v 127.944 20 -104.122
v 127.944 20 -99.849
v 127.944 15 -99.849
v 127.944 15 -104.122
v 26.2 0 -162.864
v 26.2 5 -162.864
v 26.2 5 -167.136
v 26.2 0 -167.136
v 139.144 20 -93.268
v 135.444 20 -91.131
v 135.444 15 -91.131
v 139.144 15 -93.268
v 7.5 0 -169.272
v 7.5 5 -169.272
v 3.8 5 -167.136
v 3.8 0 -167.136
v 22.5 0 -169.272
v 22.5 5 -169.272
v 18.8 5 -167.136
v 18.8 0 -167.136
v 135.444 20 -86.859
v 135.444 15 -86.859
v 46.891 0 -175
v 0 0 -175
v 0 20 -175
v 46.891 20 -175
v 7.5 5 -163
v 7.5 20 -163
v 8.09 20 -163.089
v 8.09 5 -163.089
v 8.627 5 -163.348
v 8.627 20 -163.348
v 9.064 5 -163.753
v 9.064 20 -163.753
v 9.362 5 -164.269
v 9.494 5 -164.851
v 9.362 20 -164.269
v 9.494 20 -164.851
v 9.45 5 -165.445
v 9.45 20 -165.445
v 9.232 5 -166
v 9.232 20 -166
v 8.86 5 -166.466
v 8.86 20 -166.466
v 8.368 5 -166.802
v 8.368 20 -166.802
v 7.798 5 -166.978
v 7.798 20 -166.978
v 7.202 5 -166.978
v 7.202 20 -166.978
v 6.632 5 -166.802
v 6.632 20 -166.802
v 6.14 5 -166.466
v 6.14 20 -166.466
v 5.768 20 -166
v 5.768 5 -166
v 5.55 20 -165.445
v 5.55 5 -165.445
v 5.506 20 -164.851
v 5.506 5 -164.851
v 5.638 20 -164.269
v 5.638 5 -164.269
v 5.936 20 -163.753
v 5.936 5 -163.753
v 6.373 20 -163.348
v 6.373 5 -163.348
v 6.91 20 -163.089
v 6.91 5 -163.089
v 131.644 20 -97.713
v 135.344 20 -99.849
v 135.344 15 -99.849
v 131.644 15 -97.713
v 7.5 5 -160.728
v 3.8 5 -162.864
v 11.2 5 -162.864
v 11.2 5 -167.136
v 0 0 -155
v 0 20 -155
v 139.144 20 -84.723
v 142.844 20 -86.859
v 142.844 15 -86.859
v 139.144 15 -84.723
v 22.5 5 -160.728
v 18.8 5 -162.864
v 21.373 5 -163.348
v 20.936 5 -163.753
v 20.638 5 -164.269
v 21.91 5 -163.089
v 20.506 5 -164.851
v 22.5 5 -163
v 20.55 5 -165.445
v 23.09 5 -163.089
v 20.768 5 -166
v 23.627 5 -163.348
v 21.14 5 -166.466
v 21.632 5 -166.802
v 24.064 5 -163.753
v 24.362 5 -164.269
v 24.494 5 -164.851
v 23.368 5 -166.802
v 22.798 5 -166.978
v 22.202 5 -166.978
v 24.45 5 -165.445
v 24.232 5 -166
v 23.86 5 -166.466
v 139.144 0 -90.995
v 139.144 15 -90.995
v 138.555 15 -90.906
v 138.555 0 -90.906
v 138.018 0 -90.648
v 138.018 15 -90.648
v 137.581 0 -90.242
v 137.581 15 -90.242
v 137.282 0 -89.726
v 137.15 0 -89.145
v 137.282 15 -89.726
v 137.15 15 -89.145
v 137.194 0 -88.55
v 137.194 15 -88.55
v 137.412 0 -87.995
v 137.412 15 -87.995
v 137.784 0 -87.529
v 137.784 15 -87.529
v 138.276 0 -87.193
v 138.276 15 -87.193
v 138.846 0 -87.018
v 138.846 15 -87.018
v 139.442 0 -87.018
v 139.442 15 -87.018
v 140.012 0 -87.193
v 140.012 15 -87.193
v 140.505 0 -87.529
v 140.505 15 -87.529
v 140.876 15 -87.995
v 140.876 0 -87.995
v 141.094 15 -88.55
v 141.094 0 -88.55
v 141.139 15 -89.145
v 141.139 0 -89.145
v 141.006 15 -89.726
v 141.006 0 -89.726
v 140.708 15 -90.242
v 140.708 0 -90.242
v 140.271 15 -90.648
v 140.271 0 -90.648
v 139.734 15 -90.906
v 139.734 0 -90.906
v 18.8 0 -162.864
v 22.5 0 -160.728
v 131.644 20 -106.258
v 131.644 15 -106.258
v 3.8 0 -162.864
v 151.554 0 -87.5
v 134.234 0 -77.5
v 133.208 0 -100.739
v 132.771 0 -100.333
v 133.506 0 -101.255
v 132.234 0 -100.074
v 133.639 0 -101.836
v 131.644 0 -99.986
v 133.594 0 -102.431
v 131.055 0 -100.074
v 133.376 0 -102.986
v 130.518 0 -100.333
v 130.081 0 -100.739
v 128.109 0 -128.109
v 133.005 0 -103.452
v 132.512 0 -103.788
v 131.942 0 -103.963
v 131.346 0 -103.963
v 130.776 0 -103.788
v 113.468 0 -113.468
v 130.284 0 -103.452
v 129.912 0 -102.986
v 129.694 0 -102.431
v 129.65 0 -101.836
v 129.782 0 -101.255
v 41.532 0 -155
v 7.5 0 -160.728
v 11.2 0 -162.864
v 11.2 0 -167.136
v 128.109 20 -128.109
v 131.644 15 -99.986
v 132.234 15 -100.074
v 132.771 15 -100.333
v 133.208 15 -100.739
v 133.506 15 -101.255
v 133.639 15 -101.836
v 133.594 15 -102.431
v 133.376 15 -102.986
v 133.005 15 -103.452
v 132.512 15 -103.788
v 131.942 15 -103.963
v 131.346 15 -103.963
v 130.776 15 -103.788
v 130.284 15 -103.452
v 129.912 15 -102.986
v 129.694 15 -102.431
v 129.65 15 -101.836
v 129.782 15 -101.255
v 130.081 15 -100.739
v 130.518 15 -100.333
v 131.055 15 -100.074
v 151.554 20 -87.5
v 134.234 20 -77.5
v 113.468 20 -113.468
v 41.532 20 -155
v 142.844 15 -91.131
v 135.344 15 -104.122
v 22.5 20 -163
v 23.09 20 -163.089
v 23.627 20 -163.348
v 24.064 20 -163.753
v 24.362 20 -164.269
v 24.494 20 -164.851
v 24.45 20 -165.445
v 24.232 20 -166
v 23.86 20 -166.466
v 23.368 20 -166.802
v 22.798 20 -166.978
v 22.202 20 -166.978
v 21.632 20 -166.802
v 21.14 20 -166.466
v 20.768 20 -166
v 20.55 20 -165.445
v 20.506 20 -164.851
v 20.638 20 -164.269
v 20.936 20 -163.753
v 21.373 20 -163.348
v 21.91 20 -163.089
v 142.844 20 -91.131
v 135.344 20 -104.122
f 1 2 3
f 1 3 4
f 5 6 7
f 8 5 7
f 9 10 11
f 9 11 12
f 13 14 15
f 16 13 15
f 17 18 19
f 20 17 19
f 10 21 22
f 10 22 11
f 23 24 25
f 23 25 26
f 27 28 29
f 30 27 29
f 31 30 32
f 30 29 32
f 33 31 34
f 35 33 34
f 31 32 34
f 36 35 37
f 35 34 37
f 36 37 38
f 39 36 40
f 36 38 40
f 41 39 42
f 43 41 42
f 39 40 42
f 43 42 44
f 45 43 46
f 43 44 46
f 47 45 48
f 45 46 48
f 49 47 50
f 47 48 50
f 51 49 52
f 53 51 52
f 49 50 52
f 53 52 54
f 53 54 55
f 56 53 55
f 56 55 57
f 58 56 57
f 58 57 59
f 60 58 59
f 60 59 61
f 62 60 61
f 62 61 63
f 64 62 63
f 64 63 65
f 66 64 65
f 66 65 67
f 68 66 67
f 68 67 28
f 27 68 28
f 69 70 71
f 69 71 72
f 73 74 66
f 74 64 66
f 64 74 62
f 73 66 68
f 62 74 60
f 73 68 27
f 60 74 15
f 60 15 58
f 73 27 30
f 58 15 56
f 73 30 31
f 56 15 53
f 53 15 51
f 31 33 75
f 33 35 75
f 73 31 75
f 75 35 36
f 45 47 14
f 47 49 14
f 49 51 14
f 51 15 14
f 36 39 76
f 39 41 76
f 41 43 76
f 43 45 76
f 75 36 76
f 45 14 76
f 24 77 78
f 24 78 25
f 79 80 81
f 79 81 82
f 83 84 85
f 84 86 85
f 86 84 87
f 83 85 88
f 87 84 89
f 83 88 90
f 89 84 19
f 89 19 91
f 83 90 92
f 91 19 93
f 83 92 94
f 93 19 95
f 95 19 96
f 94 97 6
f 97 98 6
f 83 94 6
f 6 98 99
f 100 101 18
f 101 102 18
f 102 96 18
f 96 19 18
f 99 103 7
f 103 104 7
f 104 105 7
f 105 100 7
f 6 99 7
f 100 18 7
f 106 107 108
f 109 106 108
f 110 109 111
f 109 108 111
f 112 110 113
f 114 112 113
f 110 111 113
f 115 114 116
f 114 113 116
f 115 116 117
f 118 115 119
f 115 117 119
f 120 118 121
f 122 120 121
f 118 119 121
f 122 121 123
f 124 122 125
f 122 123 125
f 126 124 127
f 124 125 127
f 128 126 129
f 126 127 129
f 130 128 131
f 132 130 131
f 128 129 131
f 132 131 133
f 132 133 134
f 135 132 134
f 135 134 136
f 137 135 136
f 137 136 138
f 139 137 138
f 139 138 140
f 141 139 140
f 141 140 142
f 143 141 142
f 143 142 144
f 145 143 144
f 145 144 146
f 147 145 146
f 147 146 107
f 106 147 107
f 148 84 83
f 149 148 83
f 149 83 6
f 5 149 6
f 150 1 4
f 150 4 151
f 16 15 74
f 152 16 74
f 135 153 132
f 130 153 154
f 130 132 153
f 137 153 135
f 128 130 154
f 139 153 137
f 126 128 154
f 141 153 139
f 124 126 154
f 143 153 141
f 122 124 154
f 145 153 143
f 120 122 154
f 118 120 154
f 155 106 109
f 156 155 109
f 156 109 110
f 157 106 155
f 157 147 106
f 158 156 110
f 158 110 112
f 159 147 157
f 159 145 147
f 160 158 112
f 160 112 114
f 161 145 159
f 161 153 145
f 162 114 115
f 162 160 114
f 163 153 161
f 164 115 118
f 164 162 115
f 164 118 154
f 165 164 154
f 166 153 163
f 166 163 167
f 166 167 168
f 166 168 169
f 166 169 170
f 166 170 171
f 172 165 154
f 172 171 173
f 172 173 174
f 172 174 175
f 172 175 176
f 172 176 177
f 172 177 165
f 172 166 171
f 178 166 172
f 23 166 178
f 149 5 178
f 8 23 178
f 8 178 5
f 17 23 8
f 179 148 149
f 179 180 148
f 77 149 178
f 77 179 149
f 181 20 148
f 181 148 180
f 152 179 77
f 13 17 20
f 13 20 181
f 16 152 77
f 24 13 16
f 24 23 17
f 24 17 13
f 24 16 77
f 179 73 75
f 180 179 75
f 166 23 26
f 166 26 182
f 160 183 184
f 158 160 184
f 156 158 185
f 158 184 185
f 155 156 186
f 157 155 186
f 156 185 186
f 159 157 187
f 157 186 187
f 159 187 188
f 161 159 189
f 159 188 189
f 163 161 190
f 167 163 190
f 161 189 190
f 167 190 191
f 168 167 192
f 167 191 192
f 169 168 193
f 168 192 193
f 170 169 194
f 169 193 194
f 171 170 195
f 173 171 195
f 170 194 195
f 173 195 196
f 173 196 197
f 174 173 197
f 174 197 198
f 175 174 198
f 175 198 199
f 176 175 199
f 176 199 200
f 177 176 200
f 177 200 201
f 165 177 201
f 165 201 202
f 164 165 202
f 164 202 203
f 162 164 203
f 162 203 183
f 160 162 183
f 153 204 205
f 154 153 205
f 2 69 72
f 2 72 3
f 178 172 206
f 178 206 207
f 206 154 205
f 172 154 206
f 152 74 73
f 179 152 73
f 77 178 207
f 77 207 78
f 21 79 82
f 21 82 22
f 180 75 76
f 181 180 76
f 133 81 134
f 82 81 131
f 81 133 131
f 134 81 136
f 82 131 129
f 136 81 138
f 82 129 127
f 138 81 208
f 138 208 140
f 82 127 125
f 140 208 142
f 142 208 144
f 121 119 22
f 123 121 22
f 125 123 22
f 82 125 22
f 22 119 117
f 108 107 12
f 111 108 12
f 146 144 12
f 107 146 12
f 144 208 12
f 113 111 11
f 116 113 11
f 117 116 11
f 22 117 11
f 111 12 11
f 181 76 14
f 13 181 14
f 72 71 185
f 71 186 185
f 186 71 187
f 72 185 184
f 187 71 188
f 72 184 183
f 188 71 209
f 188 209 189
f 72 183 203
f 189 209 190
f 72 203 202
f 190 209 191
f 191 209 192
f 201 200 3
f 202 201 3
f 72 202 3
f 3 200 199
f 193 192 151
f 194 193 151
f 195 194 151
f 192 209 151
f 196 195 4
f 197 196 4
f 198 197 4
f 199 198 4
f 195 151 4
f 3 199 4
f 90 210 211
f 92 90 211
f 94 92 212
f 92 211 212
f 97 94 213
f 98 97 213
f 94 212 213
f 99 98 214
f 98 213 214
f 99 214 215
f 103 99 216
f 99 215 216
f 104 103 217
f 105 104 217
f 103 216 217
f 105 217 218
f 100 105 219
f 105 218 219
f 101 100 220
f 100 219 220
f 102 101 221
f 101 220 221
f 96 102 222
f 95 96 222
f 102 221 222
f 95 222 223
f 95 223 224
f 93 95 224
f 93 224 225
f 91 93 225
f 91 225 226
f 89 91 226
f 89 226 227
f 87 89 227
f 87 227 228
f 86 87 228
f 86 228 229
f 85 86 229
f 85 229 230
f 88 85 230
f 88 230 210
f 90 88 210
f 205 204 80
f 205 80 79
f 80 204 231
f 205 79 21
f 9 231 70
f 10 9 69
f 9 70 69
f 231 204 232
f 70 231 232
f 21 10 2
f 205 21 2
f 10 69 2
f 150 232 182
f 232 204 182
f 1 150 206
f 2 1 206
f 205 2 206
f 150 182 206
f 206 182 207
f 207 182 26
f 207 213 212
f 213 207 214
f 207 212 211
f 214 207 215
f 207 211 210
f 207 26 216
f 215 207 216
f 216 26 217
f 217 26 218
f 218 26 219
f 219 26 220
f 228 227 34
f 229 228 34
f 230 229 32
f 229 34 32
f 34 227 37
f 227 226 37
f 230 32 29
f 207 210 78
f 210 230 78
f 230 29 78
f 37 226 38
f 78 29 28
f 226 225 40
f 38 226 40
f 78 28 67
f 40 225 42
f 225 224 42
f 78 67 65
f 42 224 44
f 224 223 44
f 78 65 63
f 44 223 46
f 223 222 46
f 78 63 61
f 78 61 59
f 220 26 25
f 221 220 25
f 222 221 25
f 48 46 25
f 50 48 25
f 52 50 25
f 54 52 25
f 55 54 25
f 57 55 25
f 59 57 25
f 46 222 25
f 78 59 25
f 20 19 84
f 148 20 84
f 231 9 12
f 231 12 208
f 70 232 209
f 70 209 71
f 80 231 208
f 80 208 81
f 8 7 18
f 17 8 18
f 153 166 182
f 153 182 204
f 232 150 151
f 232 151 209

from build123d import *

# Parameters (mm, degrees)
BOSS_EXTRUDE1_DEPTH = 20
SKETCH2_R           = 2
CUT_EXTRUDE1_DEPTH  = 233.365552524
CUT_EXTRUDE2_START  = -15
SKETCH2_3_R         = 2
CUT_EXTRUDE2_DEPTH  = 5
SKETCH2_4_R         = 2
CUT_EXTRUDE3_DEPTH  = 5


with BuildPart() as part:
    # Sketch1 → Boss-Extrude1 (new body)
    with BuildSketch(Plane(origin=(0, 0, 0), x_dir=(1, 0, 0), z_dir=(0, 1, 0))):
        Polygon((0, 155), (0, 175), (46.891108675, 175), (128.108891325, 128.108891325), (151.554445662, 87.5), (134.233937587, 77.5), (113.467875173, 113.467875173), (41.532124827, 155), align=None)
    extrude(amount=BOSS_EXTRUDE1_DEPTH)

    # Sketch2 → Cut-Extrude1 (cut, through all)
    with BuildSketch(Plane(origin=(0, 20, 0), x_dir=(1, 0, 0), z_dir=(0, 1, 0))):
        with Locations(Location((7.5, 165, 0), (0, 0, 270))):
            Circle(SKETCH2_R)
        with Locations(Location((22.5, 165, 0), (0, 0, 270))):
            Circle(SKETCH2_R)
        with Locations(Location((131.644191624, 101.985571585, 0), (0, 0, 270))):
            Circle(SKETCH2_R)
        with Locations(Location((139.144191624, 88.995190528, 0), (0, 0, 90))):
            Circle(SKETCH2_R)
    extrude(amount=-CUT_EXTRUDE1_DEPTH, mode=Mode.SUBTRACT)

    # Sketch2<3> → Cut-Extrude2 (cut)
    # profile 1 of 2: a face of its own
    with BuildSketch(Plane(origin=(0, 20, 0), x_dir=(1, 0, 0), z_dir=(0, 1, 0)).offset(CUT_EXTRUDE2_START)):
        Polygon((3.8, 167.136195996), (3.8, 162.863804004), (7.5, 160.727608008), (11.2, 162.863804004), (11.2, 167.136195996), (7.5, 169.272391992), align=None)
        with Locations(Location((7.5, 165, 0), (0, 0, 270))):
            Circle(SKETCH2_3_R, mode=Mode.SUBTRACT)
    # profile 2 of 2: a face of its own
    with BuildSketch(Plane(origin=(0, 20, 0), x_dir=(1, 0, 0), z_dir=(0, 1, 0)).offset(CUT_EXTRUDE2_START)):
        Polygon((26.2, 162.863804004), (26.2, 167.136195996), (22.5, 169.272391992), (18.8, 167.136195996), (18.8, 162.863804004), (22.5, 160.727608008), align=None)
        with Locations(Location((22.5, 165, 0), (0, 0, 270))):
            Circle(SKETCH2_3_R, mode=Mode.SUBTRACT)
    extrude(amount=-CUT_EXTRUDE2_DEPTH, mode=Mode.SUBTRACT)

    # Sketch2<4> → Cut-Extrude3 (cut)
    # profile 1 of 2: a face of its own
    with BuildSketch(Plane(origin=(0, 20, 0), x_dir=(1, 0, 0), z_dir=(0, 1, 0))):
        Polygon((135.344191624, 104.121767581), (135.344191624, 99.849375589), (131.644191624, 97.713179593), (127.944191624, 99.849375589), (127.944191624, 104.121767581), (131.644191624, 106.257963577), align=None)
        with Locations(Location((131.644191624, 101.985571585, 0), (0, 0, 270))):
            Circle(SKETCH2_4_R, mode=Mode.SUBTRACT)
    # profile 2 of 2: a face of its own
    with BuildSketch(Plane(origin=(0, 20, 0), x_dir=(1, 0, 0), z_dir=(0, 1, 0))):
        Polygon((135.444191624, 86.858994532), (135.444191624, 91.131386524), (139.144191624, 93.26758252), (142.844191624, 91.131386524), (142.844191624, 86.858994532), (139.144191624, 84.722798536), align=None)
        with Locations(Location((139.144191624, 88.995190528, 0), (0, 0, 270))):
            Circle(SKETCH2_4_R, mode=Mode.SUBTRACT)
    extrude(amount=-CUT_EXTRUDE3_DEPTH, mode=Mode.SUBTRACT)


solid = part.part
